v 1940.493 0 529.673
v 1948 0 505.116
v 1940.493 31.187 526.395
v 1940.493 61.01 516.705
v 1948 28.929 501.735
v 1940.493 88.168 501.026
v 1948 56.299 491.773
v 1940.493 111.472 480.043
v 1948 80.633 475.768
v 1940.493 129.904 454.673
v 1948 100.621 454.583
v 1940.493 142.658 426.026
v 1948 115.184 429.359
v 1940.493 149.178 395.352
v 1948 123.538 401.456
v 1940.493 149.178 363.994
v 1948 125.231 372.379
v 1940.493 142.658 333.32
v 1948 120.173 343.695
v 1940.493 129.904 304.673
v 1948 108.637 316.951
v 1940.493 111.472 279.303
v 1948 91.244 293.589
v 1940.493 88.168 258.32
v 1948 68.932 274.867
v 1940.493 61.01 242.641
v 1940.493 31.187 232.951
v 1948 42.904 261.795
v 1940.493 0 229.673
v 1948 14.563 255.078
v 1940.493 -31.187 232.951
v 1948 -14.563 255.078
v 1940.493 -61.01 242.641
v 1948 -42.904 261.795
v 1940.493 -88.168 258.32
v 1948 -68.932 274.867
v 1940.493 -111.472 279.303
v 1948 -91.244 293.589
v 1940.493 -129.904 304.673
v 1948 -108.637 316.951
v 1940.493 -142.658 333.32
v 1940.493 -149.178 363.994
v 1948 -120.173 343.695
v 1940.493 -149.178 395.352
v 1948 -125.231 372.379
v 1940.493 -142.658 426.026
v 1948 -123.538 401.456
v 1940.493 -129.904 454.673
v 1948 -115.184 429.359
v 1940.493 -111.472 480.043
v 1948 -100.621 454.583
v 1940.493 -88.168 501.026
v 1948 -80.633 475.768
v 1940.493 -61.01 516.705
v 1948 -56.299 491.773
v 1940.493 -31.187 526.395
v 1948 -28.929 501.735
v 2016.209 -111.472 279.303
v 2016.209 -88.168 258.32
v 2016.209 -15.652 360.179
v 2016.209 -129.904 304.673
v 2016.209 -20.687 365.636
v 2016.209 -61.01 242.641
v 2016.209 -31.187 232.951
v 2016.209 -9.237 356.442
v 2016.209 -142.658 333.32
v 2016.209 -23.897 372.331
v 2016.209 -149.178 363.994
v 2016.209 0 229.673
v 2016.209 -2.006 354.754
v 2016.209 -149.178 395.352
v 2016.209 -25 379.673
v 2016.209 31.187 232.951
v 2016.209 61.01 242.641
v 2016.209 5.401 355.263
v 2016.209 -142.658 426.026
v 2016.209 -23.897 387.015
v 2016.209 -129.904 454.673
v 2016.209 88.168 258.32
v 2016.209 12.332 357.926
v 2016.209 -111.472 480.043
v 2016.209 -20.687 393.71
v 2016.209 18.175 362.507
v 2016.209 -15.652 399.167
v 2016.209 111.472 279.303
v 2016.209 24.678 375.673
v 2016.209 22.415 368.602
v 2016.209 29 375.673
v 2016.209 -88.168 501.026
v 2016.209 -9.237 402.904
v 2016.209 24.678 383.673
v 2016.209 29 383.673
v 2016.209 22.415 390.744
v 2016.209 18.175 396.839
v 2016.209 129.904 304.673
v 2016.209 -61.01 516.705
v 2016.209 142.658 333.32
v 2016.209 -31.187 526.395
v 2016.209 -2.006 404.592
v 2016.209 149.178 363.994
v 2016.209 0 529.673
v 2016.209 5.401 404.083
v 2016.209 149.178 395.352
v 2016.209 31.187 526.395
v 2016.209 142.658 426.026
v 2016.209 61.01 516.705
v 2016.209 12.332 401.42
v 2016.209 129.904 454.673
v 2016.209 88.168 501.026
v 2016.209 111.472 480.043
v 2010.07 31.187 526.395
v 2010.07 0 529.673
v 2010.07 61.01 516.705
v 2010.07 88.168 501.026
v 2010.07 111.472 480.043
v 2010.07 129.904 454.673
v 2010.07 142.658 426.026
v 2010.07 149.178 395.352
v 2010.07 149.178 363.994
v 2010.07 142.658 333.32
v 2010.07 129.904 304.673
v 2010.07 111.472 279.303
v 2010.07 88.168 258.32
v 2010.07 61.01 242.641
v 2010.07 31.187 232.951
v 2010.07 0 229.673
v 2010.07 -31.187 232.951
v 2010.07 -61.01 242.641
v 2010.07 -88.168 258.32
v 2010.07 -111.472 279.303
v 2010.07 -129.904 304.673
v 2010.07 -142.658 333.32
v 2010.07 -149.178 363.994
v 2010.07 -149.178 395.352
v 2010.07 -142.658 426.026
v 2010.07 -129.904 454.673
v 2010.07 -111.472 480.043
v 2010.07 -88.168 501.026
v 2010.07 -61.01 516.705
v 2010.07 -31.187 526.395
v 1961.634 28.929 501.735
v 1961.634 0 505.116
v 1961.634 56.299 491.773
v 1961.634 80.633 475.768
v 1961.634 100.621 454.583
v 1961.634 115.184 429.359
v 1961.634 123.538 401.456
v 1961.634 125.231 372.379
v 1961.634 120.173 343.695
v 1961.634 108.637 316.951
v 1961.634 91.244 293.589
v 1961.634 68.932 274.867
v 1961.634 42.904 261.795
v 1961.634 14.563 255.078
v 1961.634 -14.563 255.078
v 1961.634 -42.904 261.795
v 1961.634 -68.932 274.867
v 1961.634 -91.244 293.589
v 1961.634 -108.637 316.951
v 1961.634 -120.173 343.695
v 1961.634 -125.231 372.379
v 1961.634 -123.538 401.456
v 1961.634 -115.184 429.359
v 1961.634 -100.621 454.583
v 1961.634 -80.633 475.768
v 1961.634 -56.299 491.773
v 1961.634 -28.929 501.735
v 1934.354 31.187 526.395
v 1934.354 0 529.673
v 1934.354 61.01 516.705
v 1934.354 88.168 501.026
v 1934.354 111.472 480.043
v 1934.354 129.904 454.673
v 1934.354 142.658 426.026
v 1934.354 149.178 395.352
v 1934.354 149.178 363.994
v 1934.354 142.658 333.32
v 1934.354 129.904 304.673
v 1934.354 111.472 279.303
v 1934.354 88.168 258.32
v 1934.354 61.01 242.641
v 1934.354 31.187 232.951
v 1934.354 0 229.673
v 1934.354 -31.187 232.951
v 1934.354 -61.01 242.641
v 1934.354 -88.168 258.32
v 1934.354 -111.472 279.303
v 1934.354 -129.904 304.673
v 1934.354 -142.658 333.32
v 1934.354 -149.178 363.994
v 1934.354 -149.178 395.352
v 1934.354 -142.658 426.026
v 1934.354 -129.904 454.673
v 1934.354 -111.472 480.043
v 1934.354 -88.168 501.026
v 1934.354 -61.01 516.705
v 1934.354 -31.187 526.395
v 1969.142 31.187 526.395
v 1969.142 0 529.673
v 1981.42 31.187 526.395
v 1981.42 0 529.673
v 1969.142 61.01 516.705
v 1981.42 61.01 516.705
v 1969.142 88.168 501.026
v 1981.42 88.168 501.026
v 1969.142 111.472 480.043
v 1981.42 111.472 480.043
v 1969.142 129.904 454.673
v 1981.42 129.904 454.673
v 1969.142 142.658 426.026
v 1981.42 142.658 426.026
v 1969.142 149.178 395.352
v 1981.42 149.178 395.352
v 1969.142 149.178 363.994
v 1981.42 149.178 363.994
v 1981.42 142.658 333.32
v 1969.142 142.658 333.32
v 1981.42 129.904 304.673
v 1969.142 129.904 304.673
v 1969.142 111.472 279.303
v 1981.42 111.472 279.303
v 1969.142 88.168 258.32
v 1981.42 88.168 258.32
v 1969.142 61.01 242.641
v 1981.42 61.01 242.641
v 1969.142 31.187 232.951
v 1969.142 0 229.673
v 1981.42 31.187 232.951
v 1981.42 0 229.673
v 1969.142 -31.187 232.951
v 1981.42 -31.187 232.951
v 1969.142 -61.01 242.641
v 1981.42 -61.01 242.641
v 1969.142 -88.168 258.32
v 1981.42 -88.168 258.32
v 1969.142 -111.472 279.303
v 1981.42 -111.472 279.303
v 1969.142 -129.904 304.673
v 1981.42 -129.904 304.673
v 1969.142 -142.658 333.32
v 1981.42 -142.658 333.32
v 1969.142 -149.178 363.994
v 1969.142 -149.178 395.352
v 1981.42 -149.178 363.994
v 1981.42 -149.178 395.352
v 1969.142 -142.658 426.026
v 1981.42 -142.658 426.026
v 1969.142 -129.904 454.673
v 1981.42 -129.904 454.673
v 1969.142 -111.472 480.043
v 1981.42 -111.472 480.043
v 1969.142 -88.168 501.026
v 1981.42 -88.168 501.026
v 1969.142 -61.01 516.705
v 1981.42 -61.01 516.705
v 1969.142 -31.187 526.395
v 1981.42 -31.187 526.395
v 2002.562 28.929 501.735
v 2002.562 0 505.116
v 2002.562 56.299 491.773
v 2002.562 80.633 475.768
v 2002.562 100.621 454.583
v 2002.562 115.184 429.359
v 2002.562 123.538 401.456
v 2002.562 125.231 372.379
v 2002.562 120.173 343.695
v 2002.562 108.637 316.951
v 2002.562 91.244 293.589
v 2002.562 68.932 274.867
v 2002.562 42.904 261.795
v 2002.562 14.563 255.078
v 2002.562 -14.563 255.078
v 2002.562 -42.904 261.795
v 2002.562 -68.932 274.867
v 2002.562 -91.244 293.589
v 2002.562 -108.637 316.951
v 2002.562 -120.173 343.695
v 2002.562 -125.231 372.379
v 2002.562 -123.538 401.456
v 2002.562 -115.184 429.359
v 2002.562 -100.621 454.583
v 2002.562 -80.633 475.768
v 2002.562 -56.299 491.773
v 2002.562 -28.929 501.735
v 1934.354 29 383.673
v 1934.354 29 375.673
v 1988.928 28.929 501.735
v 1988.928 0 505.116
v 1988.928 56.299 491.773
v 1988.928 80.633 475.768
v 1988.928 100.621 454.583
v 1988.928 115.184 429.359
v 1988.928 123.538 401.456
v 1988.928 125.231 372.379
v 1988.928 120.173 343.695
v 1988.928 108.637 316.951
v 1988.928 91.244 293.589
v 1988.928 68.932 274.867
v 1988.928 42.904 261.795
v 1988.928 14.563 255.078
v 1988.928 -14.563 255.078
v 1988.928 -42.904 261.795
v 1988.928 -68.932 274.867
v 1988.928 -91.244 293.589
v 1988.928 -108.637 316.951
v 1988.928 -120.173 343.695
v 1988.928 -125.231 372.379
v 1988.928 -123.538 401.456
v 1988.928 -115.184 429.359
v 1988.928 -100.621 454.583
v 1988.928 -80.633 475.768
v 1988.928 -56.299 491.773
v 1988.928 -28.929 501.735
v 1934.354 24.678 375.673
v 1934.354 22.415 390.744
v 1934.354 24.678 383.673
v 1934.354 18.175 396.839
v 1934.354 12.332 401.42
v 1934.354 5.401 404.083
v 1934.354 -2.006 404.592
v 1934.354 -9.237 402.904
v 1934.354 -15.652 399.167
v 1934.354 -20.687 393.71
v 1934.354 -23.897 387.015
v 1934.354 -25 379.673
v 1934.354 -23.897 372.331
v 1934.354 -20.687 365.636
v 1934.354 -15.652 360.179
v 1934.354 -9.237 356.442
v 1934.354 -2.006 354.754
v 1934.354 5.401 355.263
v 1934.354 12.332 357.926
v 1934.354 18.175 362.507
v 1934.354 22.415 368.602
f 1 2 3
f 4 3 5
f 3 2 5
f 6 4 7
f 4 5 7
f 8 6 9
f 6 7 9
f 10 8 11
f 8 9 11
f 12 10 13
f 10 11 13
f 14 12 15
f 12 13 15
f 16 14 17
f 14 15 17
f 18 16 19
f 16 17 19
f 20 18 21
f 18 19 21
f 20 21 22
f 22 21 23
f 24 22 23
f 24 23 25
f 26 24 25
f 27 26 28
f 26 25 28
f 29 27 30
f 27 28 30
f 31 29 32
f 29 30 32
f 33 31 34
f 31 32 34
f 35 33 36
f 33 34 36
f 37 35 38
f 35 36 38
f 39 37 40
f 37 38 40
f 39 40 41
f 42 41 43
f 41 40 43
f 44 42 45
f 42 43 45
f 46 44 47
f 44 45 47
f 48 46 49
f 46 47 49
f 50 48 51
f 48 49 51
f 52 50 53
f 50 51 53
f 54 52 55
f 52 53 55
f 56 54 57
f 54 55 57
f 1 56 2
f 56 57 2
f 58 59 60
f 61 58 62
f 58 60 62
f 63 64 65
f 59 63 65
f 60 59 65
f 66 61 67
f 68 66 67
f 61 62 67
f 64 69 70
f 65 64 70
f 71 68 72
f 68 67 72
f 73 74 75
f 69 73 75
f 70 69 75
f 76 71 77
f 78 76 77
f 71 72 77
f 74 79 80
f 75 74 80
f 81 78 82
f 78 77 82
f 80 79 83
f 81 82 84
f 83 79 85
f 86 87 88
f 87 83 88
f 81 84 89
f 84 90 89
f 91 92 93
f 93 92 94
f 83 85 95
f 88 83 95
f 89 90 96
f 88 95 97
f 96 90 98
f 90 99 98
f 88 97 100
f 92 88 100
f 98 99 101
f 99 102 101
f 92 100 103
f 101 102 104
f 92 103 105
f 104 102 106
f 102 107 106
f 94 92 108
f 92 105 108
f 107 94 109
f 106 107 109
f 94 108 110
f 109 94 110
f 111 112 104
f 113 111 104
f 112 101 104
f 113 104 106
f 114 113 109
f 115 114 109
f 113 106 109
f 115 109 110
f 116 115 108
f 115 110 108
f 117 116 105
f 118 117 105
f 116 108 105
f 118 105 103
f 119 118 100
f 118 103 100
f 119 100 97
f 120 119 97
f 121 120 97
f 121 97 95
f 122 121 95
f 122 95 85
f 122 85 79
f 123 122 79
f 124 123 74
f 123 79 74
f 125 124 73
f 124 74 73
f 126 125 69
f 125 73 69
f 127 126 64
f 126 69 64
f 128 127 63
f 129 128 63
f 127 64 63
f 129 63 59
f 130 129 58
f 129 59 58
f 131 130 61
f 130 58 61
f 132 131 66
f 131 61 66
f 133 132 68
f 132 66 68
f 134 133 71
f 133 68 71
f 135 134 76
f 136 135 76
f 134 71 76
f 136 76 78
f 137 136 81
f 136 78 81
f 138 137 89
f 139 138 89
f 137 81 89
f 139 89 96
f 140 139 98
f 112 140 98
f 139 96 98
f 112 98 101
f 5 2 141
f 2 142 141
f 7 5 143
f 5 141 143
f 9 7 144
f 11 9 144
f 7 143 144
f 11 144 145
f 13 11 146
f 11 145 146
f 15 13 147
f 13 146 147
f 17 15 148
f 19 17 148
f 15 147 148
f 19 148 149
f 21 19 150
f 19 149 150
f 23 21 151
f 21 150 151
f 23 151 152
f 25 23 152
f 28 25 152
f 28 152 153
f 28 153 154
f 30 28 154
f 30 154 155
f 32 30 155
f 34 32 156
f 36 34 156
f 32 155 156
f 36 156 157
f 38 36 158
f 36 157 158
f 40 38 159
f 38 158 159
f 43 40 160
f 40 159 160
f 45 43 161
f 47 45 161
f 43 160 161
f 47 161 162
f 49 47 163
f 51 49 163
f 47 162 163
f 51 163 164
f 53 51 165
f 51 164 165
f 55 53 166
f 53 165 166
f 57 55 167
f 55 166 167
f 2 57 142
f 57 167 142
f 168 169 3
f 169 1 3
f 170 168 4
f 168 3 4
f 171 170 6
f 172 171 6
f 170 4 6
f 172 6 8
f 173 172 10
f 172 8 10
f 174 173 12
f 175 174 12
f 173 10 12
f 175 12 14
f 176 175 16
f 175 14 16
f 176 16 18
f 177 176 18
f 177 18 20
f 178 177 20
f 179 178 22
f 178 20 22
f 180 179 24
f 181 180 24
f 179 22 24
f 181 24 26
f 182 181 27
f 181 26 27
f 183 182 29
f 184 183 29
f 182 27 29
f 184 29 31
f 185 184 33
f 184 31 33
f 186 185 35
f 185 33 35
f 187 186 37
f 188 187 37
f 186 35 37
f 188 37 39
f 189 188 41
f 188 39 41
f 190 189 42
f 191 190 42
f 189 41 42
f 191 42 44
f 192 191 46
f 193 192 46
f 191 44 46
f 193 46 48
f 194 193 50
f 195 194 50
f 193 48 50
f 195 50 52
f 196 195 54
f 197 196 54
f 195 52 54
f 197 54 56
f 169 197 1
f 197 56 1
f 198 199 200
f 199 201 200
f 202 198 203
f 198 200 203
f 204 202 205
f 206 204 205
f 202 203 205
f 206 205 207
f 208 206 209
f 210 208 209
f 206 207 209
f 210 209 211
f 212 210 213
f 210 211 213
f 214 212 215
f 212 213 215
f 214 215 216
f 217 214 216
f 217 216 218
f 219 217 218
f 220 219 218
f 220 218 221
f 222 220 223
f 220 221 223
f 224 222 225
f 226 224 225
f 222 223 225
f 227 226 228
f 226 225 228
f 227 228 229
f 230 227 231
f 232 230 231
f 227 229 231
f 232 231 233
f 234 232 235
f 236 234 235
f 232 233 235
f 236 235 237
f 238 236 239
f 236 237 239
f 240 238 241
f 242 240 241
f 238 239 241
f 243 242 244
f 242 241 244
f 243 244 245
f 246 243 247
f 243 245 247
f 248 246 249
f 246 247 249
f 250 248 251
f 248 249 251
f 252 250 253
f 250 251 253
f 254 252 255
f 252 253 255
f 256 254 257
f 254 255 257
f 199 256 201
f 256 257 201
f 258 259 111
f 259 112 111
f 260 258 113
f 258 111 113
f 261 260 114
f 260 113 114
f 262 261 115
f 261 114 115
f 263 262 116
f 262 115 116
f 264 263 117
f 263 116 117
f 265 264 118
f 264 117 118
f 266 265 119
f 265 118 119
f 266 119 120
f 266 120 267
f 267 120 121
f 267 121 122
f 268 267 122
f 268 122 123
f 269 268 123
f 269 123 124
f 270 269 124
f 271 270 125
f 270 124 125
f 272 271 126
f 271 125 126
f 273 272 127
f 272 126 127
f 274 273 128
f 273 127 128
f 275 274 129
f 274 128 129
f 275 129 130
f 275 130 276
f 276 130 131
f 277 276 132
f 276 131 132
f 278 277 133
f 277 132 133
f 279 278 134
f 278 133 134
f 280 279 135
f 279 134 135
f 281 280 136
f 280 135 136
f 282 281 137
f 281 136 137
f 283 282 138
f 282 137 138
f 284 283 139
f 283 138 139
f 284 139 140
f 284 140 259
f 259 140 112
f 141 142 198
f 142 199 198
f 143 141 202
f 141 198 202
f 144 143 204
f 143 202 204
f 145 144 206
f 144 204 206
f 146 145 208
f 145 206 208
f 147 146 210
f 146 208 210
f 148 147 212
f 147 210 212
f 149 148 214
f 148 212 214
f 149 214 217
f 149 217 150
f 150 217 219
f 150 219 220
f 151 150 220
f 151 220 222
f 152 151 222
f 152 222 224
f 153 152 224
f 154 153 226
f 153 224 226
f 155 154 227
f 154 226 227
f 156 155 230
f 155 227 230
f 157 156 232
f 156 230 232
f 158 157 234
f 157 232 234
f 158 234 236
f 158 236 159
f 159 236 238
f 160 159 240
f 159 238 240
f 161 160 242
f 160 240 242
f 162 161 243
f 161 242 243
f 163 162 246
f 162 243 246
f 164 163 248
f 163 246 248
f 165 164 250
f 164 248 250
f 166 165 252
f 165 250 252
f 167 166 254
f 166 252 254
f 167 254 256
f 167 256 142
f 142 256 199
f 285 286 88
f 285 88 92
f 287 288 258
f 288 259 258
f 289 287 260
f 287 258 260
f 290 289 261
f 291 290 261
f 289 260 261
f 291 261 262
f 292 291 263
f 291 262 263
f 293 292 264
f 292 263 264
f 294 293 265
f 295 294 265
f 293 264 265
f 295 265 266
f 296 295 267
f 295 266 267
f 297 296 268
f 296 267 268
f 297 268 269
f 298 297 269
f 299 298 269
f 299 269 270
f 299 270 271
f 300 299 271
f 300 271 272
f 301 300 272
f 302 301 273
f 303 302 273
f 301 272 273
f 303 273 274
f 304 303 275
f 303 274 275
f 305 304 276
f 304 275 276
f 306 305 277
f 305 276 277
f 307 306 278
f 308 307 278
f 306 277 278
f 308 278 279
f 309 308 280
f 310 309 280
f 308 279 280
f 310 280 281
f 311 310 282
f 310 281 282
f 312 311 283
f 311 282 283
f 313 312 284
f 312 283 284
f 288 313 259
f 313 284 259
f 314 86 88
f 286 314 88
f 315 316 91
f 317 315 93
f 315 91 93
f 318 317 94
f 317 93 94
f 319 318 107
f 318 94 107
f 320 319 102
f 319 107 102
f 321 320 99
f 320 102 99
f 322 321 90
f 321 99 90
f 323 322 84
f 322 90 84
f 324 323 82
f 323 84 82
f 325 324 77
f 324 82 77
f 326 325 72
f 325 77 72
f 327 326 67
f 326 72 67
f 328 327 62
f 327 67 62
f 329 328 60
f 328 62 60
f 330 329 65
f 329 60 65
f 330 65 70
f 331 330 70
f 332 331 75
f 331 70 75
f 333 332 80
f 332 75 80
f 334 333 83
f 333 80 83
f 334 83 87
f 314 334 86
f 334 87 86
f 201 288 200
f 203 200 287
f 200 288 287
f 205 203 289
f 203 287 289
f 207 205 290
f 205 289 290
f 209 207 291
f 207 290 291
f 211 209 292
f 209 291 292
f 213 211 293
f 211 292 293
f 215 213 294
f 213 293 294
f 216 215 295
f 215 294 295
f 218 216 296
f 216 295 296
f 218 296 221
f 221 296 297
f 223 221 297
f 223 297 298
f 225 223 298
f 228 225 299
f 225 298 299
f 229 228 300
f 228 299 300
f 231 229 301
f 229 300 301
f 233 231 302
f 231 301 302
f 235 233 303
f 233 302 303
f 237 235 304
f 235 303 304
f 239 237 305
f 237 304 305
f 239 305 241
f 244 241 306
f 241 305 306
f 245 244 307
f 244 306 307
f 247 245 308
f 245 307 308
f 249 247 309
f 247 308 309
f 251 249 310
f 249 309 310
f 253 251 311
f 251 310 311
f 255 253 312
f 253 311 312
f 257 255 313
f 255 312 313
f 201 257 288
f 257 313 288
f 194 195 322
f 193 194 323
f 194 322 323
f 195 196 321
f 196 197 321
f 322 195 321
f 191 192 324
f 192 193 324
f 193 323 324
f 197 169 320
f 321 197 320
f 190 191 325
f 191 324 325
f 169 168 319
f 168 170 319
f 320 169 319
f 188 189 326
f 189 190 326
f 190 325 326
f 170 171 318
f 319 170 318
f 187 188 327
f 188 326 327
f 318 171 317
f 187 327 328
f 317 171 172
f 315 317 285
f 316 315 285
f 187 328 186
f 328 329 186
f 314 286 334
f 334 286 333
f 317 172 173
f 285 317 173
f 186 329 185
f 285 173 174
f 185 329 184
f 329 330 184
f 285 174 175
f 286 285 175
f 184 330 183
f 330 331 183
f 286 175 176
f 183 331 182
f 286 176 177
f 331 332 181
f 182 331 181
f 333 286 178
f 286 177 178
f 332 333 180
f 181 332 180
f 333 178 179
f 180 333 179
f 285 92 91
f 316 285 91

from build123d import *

# Parameters (mm, degrees)
IZIM2_R               = 20
KES_EKSTR_ZYON1_DEPTH = 160
IZIM3_R               = 25
KES_EKSTR_ZYON2_DEPTH = 120
KES_EKSTR_ZYON3_DEPTH = 120


with BuildPart() as part:
    # Çizim1 → Döndür1 (revolve)
    with BuildSketch(Plane(origin=(0, 0, 379.673045167), x_dir=(-1, 0, 0), z_dir=(0, 0, -1)), mode=Mode.PRIVATE) as d_nd_r1_sk:
        Polygon((-2016.208991354, 150), (-2016.208991354, 0), (-1934.353602541, 0), (-1934.353602541, 150), (-1940.492756702, 150), (-1948.000467843, 125.443383356), (-1961.634431646, 125.443383356), (-1969.142142787, 150), (-1981.420451109, 150), (-1988.928162249, 125.443383356), (-2002.562126052, 125.443383356), (-2010.069837193, 150), align=None)
    revolve(d_nd_r1_sk.sketch.rotate(Axis((2016.208991354, 0, 379.673045167), (-1, 0, 0)), 270), axis=Axis((2016.208991354, 0, 379.673045167), (-1, 0, 0)))

    # Çizim2 → Kes-Ekstrüzyon1 (cut)
    with BuildSketch(Plane.ZY.offset(-1934.353602541)):
        with Locations((379.673045167, 0)):
            Circle(IZIM2_R)
    extrude(amount=-KES_EKSTR_ZYON1_DEPTH, mode=Mode.SUBTRACT)

    # Çizim3 → Kes-Ekstrüzyon2 (cut)
    with BuildSketch(Plane(origin=(2016.208991354, 0, 0), x_dir=(0, 0, -1), z_dir=(1, 0, 0))):
        with Locations((-379.673045167, 0)):
            Circle(IZIM3_R)
    extrude(amount=-KES_EKSTR_ZYON2_DEPTH, mode=Mode.SUBTRACT)

    # Çizim4 → Kes-Ekstrüzyon3 (cut)
    with BuildSketch(Plane(origin=(2016.208991354, 0, 0), x_dir=(0, 0, -1), z_dir=(1, 0, 0))):
        with BuildLine():
            Line((-379.673045167, 29), (-379.673045167, 25))
            ThreePointArc((-379.673045167, 25), (-377.666572387, 24.919351255), (-375.673045167, 24.677925359))
            Line((-375.673045167, 24.677925359), (-375.673045167, 29))
            Line((-375.673045167, 29), (-379.673045167, 29))
        make_face()
        with BuildLine():
            ThreePointArc((-383.673045167, 24.677925359), (-381.679517947, 24.919351255), (-379.673045167, 25))
            Line((-379.673045167, 25), (-379.673045167, 29))
            Line((-379.673045167, 29), (-383.673045167, 29))
            Line((-383.673045167, 29), (-383.673045167, 24.677925359))
        make_face()
    extrude(amount=-KES_EKSTR_ZYON3_DEPTH, mode=Mode.SUBTRACT)


solid = part.part
